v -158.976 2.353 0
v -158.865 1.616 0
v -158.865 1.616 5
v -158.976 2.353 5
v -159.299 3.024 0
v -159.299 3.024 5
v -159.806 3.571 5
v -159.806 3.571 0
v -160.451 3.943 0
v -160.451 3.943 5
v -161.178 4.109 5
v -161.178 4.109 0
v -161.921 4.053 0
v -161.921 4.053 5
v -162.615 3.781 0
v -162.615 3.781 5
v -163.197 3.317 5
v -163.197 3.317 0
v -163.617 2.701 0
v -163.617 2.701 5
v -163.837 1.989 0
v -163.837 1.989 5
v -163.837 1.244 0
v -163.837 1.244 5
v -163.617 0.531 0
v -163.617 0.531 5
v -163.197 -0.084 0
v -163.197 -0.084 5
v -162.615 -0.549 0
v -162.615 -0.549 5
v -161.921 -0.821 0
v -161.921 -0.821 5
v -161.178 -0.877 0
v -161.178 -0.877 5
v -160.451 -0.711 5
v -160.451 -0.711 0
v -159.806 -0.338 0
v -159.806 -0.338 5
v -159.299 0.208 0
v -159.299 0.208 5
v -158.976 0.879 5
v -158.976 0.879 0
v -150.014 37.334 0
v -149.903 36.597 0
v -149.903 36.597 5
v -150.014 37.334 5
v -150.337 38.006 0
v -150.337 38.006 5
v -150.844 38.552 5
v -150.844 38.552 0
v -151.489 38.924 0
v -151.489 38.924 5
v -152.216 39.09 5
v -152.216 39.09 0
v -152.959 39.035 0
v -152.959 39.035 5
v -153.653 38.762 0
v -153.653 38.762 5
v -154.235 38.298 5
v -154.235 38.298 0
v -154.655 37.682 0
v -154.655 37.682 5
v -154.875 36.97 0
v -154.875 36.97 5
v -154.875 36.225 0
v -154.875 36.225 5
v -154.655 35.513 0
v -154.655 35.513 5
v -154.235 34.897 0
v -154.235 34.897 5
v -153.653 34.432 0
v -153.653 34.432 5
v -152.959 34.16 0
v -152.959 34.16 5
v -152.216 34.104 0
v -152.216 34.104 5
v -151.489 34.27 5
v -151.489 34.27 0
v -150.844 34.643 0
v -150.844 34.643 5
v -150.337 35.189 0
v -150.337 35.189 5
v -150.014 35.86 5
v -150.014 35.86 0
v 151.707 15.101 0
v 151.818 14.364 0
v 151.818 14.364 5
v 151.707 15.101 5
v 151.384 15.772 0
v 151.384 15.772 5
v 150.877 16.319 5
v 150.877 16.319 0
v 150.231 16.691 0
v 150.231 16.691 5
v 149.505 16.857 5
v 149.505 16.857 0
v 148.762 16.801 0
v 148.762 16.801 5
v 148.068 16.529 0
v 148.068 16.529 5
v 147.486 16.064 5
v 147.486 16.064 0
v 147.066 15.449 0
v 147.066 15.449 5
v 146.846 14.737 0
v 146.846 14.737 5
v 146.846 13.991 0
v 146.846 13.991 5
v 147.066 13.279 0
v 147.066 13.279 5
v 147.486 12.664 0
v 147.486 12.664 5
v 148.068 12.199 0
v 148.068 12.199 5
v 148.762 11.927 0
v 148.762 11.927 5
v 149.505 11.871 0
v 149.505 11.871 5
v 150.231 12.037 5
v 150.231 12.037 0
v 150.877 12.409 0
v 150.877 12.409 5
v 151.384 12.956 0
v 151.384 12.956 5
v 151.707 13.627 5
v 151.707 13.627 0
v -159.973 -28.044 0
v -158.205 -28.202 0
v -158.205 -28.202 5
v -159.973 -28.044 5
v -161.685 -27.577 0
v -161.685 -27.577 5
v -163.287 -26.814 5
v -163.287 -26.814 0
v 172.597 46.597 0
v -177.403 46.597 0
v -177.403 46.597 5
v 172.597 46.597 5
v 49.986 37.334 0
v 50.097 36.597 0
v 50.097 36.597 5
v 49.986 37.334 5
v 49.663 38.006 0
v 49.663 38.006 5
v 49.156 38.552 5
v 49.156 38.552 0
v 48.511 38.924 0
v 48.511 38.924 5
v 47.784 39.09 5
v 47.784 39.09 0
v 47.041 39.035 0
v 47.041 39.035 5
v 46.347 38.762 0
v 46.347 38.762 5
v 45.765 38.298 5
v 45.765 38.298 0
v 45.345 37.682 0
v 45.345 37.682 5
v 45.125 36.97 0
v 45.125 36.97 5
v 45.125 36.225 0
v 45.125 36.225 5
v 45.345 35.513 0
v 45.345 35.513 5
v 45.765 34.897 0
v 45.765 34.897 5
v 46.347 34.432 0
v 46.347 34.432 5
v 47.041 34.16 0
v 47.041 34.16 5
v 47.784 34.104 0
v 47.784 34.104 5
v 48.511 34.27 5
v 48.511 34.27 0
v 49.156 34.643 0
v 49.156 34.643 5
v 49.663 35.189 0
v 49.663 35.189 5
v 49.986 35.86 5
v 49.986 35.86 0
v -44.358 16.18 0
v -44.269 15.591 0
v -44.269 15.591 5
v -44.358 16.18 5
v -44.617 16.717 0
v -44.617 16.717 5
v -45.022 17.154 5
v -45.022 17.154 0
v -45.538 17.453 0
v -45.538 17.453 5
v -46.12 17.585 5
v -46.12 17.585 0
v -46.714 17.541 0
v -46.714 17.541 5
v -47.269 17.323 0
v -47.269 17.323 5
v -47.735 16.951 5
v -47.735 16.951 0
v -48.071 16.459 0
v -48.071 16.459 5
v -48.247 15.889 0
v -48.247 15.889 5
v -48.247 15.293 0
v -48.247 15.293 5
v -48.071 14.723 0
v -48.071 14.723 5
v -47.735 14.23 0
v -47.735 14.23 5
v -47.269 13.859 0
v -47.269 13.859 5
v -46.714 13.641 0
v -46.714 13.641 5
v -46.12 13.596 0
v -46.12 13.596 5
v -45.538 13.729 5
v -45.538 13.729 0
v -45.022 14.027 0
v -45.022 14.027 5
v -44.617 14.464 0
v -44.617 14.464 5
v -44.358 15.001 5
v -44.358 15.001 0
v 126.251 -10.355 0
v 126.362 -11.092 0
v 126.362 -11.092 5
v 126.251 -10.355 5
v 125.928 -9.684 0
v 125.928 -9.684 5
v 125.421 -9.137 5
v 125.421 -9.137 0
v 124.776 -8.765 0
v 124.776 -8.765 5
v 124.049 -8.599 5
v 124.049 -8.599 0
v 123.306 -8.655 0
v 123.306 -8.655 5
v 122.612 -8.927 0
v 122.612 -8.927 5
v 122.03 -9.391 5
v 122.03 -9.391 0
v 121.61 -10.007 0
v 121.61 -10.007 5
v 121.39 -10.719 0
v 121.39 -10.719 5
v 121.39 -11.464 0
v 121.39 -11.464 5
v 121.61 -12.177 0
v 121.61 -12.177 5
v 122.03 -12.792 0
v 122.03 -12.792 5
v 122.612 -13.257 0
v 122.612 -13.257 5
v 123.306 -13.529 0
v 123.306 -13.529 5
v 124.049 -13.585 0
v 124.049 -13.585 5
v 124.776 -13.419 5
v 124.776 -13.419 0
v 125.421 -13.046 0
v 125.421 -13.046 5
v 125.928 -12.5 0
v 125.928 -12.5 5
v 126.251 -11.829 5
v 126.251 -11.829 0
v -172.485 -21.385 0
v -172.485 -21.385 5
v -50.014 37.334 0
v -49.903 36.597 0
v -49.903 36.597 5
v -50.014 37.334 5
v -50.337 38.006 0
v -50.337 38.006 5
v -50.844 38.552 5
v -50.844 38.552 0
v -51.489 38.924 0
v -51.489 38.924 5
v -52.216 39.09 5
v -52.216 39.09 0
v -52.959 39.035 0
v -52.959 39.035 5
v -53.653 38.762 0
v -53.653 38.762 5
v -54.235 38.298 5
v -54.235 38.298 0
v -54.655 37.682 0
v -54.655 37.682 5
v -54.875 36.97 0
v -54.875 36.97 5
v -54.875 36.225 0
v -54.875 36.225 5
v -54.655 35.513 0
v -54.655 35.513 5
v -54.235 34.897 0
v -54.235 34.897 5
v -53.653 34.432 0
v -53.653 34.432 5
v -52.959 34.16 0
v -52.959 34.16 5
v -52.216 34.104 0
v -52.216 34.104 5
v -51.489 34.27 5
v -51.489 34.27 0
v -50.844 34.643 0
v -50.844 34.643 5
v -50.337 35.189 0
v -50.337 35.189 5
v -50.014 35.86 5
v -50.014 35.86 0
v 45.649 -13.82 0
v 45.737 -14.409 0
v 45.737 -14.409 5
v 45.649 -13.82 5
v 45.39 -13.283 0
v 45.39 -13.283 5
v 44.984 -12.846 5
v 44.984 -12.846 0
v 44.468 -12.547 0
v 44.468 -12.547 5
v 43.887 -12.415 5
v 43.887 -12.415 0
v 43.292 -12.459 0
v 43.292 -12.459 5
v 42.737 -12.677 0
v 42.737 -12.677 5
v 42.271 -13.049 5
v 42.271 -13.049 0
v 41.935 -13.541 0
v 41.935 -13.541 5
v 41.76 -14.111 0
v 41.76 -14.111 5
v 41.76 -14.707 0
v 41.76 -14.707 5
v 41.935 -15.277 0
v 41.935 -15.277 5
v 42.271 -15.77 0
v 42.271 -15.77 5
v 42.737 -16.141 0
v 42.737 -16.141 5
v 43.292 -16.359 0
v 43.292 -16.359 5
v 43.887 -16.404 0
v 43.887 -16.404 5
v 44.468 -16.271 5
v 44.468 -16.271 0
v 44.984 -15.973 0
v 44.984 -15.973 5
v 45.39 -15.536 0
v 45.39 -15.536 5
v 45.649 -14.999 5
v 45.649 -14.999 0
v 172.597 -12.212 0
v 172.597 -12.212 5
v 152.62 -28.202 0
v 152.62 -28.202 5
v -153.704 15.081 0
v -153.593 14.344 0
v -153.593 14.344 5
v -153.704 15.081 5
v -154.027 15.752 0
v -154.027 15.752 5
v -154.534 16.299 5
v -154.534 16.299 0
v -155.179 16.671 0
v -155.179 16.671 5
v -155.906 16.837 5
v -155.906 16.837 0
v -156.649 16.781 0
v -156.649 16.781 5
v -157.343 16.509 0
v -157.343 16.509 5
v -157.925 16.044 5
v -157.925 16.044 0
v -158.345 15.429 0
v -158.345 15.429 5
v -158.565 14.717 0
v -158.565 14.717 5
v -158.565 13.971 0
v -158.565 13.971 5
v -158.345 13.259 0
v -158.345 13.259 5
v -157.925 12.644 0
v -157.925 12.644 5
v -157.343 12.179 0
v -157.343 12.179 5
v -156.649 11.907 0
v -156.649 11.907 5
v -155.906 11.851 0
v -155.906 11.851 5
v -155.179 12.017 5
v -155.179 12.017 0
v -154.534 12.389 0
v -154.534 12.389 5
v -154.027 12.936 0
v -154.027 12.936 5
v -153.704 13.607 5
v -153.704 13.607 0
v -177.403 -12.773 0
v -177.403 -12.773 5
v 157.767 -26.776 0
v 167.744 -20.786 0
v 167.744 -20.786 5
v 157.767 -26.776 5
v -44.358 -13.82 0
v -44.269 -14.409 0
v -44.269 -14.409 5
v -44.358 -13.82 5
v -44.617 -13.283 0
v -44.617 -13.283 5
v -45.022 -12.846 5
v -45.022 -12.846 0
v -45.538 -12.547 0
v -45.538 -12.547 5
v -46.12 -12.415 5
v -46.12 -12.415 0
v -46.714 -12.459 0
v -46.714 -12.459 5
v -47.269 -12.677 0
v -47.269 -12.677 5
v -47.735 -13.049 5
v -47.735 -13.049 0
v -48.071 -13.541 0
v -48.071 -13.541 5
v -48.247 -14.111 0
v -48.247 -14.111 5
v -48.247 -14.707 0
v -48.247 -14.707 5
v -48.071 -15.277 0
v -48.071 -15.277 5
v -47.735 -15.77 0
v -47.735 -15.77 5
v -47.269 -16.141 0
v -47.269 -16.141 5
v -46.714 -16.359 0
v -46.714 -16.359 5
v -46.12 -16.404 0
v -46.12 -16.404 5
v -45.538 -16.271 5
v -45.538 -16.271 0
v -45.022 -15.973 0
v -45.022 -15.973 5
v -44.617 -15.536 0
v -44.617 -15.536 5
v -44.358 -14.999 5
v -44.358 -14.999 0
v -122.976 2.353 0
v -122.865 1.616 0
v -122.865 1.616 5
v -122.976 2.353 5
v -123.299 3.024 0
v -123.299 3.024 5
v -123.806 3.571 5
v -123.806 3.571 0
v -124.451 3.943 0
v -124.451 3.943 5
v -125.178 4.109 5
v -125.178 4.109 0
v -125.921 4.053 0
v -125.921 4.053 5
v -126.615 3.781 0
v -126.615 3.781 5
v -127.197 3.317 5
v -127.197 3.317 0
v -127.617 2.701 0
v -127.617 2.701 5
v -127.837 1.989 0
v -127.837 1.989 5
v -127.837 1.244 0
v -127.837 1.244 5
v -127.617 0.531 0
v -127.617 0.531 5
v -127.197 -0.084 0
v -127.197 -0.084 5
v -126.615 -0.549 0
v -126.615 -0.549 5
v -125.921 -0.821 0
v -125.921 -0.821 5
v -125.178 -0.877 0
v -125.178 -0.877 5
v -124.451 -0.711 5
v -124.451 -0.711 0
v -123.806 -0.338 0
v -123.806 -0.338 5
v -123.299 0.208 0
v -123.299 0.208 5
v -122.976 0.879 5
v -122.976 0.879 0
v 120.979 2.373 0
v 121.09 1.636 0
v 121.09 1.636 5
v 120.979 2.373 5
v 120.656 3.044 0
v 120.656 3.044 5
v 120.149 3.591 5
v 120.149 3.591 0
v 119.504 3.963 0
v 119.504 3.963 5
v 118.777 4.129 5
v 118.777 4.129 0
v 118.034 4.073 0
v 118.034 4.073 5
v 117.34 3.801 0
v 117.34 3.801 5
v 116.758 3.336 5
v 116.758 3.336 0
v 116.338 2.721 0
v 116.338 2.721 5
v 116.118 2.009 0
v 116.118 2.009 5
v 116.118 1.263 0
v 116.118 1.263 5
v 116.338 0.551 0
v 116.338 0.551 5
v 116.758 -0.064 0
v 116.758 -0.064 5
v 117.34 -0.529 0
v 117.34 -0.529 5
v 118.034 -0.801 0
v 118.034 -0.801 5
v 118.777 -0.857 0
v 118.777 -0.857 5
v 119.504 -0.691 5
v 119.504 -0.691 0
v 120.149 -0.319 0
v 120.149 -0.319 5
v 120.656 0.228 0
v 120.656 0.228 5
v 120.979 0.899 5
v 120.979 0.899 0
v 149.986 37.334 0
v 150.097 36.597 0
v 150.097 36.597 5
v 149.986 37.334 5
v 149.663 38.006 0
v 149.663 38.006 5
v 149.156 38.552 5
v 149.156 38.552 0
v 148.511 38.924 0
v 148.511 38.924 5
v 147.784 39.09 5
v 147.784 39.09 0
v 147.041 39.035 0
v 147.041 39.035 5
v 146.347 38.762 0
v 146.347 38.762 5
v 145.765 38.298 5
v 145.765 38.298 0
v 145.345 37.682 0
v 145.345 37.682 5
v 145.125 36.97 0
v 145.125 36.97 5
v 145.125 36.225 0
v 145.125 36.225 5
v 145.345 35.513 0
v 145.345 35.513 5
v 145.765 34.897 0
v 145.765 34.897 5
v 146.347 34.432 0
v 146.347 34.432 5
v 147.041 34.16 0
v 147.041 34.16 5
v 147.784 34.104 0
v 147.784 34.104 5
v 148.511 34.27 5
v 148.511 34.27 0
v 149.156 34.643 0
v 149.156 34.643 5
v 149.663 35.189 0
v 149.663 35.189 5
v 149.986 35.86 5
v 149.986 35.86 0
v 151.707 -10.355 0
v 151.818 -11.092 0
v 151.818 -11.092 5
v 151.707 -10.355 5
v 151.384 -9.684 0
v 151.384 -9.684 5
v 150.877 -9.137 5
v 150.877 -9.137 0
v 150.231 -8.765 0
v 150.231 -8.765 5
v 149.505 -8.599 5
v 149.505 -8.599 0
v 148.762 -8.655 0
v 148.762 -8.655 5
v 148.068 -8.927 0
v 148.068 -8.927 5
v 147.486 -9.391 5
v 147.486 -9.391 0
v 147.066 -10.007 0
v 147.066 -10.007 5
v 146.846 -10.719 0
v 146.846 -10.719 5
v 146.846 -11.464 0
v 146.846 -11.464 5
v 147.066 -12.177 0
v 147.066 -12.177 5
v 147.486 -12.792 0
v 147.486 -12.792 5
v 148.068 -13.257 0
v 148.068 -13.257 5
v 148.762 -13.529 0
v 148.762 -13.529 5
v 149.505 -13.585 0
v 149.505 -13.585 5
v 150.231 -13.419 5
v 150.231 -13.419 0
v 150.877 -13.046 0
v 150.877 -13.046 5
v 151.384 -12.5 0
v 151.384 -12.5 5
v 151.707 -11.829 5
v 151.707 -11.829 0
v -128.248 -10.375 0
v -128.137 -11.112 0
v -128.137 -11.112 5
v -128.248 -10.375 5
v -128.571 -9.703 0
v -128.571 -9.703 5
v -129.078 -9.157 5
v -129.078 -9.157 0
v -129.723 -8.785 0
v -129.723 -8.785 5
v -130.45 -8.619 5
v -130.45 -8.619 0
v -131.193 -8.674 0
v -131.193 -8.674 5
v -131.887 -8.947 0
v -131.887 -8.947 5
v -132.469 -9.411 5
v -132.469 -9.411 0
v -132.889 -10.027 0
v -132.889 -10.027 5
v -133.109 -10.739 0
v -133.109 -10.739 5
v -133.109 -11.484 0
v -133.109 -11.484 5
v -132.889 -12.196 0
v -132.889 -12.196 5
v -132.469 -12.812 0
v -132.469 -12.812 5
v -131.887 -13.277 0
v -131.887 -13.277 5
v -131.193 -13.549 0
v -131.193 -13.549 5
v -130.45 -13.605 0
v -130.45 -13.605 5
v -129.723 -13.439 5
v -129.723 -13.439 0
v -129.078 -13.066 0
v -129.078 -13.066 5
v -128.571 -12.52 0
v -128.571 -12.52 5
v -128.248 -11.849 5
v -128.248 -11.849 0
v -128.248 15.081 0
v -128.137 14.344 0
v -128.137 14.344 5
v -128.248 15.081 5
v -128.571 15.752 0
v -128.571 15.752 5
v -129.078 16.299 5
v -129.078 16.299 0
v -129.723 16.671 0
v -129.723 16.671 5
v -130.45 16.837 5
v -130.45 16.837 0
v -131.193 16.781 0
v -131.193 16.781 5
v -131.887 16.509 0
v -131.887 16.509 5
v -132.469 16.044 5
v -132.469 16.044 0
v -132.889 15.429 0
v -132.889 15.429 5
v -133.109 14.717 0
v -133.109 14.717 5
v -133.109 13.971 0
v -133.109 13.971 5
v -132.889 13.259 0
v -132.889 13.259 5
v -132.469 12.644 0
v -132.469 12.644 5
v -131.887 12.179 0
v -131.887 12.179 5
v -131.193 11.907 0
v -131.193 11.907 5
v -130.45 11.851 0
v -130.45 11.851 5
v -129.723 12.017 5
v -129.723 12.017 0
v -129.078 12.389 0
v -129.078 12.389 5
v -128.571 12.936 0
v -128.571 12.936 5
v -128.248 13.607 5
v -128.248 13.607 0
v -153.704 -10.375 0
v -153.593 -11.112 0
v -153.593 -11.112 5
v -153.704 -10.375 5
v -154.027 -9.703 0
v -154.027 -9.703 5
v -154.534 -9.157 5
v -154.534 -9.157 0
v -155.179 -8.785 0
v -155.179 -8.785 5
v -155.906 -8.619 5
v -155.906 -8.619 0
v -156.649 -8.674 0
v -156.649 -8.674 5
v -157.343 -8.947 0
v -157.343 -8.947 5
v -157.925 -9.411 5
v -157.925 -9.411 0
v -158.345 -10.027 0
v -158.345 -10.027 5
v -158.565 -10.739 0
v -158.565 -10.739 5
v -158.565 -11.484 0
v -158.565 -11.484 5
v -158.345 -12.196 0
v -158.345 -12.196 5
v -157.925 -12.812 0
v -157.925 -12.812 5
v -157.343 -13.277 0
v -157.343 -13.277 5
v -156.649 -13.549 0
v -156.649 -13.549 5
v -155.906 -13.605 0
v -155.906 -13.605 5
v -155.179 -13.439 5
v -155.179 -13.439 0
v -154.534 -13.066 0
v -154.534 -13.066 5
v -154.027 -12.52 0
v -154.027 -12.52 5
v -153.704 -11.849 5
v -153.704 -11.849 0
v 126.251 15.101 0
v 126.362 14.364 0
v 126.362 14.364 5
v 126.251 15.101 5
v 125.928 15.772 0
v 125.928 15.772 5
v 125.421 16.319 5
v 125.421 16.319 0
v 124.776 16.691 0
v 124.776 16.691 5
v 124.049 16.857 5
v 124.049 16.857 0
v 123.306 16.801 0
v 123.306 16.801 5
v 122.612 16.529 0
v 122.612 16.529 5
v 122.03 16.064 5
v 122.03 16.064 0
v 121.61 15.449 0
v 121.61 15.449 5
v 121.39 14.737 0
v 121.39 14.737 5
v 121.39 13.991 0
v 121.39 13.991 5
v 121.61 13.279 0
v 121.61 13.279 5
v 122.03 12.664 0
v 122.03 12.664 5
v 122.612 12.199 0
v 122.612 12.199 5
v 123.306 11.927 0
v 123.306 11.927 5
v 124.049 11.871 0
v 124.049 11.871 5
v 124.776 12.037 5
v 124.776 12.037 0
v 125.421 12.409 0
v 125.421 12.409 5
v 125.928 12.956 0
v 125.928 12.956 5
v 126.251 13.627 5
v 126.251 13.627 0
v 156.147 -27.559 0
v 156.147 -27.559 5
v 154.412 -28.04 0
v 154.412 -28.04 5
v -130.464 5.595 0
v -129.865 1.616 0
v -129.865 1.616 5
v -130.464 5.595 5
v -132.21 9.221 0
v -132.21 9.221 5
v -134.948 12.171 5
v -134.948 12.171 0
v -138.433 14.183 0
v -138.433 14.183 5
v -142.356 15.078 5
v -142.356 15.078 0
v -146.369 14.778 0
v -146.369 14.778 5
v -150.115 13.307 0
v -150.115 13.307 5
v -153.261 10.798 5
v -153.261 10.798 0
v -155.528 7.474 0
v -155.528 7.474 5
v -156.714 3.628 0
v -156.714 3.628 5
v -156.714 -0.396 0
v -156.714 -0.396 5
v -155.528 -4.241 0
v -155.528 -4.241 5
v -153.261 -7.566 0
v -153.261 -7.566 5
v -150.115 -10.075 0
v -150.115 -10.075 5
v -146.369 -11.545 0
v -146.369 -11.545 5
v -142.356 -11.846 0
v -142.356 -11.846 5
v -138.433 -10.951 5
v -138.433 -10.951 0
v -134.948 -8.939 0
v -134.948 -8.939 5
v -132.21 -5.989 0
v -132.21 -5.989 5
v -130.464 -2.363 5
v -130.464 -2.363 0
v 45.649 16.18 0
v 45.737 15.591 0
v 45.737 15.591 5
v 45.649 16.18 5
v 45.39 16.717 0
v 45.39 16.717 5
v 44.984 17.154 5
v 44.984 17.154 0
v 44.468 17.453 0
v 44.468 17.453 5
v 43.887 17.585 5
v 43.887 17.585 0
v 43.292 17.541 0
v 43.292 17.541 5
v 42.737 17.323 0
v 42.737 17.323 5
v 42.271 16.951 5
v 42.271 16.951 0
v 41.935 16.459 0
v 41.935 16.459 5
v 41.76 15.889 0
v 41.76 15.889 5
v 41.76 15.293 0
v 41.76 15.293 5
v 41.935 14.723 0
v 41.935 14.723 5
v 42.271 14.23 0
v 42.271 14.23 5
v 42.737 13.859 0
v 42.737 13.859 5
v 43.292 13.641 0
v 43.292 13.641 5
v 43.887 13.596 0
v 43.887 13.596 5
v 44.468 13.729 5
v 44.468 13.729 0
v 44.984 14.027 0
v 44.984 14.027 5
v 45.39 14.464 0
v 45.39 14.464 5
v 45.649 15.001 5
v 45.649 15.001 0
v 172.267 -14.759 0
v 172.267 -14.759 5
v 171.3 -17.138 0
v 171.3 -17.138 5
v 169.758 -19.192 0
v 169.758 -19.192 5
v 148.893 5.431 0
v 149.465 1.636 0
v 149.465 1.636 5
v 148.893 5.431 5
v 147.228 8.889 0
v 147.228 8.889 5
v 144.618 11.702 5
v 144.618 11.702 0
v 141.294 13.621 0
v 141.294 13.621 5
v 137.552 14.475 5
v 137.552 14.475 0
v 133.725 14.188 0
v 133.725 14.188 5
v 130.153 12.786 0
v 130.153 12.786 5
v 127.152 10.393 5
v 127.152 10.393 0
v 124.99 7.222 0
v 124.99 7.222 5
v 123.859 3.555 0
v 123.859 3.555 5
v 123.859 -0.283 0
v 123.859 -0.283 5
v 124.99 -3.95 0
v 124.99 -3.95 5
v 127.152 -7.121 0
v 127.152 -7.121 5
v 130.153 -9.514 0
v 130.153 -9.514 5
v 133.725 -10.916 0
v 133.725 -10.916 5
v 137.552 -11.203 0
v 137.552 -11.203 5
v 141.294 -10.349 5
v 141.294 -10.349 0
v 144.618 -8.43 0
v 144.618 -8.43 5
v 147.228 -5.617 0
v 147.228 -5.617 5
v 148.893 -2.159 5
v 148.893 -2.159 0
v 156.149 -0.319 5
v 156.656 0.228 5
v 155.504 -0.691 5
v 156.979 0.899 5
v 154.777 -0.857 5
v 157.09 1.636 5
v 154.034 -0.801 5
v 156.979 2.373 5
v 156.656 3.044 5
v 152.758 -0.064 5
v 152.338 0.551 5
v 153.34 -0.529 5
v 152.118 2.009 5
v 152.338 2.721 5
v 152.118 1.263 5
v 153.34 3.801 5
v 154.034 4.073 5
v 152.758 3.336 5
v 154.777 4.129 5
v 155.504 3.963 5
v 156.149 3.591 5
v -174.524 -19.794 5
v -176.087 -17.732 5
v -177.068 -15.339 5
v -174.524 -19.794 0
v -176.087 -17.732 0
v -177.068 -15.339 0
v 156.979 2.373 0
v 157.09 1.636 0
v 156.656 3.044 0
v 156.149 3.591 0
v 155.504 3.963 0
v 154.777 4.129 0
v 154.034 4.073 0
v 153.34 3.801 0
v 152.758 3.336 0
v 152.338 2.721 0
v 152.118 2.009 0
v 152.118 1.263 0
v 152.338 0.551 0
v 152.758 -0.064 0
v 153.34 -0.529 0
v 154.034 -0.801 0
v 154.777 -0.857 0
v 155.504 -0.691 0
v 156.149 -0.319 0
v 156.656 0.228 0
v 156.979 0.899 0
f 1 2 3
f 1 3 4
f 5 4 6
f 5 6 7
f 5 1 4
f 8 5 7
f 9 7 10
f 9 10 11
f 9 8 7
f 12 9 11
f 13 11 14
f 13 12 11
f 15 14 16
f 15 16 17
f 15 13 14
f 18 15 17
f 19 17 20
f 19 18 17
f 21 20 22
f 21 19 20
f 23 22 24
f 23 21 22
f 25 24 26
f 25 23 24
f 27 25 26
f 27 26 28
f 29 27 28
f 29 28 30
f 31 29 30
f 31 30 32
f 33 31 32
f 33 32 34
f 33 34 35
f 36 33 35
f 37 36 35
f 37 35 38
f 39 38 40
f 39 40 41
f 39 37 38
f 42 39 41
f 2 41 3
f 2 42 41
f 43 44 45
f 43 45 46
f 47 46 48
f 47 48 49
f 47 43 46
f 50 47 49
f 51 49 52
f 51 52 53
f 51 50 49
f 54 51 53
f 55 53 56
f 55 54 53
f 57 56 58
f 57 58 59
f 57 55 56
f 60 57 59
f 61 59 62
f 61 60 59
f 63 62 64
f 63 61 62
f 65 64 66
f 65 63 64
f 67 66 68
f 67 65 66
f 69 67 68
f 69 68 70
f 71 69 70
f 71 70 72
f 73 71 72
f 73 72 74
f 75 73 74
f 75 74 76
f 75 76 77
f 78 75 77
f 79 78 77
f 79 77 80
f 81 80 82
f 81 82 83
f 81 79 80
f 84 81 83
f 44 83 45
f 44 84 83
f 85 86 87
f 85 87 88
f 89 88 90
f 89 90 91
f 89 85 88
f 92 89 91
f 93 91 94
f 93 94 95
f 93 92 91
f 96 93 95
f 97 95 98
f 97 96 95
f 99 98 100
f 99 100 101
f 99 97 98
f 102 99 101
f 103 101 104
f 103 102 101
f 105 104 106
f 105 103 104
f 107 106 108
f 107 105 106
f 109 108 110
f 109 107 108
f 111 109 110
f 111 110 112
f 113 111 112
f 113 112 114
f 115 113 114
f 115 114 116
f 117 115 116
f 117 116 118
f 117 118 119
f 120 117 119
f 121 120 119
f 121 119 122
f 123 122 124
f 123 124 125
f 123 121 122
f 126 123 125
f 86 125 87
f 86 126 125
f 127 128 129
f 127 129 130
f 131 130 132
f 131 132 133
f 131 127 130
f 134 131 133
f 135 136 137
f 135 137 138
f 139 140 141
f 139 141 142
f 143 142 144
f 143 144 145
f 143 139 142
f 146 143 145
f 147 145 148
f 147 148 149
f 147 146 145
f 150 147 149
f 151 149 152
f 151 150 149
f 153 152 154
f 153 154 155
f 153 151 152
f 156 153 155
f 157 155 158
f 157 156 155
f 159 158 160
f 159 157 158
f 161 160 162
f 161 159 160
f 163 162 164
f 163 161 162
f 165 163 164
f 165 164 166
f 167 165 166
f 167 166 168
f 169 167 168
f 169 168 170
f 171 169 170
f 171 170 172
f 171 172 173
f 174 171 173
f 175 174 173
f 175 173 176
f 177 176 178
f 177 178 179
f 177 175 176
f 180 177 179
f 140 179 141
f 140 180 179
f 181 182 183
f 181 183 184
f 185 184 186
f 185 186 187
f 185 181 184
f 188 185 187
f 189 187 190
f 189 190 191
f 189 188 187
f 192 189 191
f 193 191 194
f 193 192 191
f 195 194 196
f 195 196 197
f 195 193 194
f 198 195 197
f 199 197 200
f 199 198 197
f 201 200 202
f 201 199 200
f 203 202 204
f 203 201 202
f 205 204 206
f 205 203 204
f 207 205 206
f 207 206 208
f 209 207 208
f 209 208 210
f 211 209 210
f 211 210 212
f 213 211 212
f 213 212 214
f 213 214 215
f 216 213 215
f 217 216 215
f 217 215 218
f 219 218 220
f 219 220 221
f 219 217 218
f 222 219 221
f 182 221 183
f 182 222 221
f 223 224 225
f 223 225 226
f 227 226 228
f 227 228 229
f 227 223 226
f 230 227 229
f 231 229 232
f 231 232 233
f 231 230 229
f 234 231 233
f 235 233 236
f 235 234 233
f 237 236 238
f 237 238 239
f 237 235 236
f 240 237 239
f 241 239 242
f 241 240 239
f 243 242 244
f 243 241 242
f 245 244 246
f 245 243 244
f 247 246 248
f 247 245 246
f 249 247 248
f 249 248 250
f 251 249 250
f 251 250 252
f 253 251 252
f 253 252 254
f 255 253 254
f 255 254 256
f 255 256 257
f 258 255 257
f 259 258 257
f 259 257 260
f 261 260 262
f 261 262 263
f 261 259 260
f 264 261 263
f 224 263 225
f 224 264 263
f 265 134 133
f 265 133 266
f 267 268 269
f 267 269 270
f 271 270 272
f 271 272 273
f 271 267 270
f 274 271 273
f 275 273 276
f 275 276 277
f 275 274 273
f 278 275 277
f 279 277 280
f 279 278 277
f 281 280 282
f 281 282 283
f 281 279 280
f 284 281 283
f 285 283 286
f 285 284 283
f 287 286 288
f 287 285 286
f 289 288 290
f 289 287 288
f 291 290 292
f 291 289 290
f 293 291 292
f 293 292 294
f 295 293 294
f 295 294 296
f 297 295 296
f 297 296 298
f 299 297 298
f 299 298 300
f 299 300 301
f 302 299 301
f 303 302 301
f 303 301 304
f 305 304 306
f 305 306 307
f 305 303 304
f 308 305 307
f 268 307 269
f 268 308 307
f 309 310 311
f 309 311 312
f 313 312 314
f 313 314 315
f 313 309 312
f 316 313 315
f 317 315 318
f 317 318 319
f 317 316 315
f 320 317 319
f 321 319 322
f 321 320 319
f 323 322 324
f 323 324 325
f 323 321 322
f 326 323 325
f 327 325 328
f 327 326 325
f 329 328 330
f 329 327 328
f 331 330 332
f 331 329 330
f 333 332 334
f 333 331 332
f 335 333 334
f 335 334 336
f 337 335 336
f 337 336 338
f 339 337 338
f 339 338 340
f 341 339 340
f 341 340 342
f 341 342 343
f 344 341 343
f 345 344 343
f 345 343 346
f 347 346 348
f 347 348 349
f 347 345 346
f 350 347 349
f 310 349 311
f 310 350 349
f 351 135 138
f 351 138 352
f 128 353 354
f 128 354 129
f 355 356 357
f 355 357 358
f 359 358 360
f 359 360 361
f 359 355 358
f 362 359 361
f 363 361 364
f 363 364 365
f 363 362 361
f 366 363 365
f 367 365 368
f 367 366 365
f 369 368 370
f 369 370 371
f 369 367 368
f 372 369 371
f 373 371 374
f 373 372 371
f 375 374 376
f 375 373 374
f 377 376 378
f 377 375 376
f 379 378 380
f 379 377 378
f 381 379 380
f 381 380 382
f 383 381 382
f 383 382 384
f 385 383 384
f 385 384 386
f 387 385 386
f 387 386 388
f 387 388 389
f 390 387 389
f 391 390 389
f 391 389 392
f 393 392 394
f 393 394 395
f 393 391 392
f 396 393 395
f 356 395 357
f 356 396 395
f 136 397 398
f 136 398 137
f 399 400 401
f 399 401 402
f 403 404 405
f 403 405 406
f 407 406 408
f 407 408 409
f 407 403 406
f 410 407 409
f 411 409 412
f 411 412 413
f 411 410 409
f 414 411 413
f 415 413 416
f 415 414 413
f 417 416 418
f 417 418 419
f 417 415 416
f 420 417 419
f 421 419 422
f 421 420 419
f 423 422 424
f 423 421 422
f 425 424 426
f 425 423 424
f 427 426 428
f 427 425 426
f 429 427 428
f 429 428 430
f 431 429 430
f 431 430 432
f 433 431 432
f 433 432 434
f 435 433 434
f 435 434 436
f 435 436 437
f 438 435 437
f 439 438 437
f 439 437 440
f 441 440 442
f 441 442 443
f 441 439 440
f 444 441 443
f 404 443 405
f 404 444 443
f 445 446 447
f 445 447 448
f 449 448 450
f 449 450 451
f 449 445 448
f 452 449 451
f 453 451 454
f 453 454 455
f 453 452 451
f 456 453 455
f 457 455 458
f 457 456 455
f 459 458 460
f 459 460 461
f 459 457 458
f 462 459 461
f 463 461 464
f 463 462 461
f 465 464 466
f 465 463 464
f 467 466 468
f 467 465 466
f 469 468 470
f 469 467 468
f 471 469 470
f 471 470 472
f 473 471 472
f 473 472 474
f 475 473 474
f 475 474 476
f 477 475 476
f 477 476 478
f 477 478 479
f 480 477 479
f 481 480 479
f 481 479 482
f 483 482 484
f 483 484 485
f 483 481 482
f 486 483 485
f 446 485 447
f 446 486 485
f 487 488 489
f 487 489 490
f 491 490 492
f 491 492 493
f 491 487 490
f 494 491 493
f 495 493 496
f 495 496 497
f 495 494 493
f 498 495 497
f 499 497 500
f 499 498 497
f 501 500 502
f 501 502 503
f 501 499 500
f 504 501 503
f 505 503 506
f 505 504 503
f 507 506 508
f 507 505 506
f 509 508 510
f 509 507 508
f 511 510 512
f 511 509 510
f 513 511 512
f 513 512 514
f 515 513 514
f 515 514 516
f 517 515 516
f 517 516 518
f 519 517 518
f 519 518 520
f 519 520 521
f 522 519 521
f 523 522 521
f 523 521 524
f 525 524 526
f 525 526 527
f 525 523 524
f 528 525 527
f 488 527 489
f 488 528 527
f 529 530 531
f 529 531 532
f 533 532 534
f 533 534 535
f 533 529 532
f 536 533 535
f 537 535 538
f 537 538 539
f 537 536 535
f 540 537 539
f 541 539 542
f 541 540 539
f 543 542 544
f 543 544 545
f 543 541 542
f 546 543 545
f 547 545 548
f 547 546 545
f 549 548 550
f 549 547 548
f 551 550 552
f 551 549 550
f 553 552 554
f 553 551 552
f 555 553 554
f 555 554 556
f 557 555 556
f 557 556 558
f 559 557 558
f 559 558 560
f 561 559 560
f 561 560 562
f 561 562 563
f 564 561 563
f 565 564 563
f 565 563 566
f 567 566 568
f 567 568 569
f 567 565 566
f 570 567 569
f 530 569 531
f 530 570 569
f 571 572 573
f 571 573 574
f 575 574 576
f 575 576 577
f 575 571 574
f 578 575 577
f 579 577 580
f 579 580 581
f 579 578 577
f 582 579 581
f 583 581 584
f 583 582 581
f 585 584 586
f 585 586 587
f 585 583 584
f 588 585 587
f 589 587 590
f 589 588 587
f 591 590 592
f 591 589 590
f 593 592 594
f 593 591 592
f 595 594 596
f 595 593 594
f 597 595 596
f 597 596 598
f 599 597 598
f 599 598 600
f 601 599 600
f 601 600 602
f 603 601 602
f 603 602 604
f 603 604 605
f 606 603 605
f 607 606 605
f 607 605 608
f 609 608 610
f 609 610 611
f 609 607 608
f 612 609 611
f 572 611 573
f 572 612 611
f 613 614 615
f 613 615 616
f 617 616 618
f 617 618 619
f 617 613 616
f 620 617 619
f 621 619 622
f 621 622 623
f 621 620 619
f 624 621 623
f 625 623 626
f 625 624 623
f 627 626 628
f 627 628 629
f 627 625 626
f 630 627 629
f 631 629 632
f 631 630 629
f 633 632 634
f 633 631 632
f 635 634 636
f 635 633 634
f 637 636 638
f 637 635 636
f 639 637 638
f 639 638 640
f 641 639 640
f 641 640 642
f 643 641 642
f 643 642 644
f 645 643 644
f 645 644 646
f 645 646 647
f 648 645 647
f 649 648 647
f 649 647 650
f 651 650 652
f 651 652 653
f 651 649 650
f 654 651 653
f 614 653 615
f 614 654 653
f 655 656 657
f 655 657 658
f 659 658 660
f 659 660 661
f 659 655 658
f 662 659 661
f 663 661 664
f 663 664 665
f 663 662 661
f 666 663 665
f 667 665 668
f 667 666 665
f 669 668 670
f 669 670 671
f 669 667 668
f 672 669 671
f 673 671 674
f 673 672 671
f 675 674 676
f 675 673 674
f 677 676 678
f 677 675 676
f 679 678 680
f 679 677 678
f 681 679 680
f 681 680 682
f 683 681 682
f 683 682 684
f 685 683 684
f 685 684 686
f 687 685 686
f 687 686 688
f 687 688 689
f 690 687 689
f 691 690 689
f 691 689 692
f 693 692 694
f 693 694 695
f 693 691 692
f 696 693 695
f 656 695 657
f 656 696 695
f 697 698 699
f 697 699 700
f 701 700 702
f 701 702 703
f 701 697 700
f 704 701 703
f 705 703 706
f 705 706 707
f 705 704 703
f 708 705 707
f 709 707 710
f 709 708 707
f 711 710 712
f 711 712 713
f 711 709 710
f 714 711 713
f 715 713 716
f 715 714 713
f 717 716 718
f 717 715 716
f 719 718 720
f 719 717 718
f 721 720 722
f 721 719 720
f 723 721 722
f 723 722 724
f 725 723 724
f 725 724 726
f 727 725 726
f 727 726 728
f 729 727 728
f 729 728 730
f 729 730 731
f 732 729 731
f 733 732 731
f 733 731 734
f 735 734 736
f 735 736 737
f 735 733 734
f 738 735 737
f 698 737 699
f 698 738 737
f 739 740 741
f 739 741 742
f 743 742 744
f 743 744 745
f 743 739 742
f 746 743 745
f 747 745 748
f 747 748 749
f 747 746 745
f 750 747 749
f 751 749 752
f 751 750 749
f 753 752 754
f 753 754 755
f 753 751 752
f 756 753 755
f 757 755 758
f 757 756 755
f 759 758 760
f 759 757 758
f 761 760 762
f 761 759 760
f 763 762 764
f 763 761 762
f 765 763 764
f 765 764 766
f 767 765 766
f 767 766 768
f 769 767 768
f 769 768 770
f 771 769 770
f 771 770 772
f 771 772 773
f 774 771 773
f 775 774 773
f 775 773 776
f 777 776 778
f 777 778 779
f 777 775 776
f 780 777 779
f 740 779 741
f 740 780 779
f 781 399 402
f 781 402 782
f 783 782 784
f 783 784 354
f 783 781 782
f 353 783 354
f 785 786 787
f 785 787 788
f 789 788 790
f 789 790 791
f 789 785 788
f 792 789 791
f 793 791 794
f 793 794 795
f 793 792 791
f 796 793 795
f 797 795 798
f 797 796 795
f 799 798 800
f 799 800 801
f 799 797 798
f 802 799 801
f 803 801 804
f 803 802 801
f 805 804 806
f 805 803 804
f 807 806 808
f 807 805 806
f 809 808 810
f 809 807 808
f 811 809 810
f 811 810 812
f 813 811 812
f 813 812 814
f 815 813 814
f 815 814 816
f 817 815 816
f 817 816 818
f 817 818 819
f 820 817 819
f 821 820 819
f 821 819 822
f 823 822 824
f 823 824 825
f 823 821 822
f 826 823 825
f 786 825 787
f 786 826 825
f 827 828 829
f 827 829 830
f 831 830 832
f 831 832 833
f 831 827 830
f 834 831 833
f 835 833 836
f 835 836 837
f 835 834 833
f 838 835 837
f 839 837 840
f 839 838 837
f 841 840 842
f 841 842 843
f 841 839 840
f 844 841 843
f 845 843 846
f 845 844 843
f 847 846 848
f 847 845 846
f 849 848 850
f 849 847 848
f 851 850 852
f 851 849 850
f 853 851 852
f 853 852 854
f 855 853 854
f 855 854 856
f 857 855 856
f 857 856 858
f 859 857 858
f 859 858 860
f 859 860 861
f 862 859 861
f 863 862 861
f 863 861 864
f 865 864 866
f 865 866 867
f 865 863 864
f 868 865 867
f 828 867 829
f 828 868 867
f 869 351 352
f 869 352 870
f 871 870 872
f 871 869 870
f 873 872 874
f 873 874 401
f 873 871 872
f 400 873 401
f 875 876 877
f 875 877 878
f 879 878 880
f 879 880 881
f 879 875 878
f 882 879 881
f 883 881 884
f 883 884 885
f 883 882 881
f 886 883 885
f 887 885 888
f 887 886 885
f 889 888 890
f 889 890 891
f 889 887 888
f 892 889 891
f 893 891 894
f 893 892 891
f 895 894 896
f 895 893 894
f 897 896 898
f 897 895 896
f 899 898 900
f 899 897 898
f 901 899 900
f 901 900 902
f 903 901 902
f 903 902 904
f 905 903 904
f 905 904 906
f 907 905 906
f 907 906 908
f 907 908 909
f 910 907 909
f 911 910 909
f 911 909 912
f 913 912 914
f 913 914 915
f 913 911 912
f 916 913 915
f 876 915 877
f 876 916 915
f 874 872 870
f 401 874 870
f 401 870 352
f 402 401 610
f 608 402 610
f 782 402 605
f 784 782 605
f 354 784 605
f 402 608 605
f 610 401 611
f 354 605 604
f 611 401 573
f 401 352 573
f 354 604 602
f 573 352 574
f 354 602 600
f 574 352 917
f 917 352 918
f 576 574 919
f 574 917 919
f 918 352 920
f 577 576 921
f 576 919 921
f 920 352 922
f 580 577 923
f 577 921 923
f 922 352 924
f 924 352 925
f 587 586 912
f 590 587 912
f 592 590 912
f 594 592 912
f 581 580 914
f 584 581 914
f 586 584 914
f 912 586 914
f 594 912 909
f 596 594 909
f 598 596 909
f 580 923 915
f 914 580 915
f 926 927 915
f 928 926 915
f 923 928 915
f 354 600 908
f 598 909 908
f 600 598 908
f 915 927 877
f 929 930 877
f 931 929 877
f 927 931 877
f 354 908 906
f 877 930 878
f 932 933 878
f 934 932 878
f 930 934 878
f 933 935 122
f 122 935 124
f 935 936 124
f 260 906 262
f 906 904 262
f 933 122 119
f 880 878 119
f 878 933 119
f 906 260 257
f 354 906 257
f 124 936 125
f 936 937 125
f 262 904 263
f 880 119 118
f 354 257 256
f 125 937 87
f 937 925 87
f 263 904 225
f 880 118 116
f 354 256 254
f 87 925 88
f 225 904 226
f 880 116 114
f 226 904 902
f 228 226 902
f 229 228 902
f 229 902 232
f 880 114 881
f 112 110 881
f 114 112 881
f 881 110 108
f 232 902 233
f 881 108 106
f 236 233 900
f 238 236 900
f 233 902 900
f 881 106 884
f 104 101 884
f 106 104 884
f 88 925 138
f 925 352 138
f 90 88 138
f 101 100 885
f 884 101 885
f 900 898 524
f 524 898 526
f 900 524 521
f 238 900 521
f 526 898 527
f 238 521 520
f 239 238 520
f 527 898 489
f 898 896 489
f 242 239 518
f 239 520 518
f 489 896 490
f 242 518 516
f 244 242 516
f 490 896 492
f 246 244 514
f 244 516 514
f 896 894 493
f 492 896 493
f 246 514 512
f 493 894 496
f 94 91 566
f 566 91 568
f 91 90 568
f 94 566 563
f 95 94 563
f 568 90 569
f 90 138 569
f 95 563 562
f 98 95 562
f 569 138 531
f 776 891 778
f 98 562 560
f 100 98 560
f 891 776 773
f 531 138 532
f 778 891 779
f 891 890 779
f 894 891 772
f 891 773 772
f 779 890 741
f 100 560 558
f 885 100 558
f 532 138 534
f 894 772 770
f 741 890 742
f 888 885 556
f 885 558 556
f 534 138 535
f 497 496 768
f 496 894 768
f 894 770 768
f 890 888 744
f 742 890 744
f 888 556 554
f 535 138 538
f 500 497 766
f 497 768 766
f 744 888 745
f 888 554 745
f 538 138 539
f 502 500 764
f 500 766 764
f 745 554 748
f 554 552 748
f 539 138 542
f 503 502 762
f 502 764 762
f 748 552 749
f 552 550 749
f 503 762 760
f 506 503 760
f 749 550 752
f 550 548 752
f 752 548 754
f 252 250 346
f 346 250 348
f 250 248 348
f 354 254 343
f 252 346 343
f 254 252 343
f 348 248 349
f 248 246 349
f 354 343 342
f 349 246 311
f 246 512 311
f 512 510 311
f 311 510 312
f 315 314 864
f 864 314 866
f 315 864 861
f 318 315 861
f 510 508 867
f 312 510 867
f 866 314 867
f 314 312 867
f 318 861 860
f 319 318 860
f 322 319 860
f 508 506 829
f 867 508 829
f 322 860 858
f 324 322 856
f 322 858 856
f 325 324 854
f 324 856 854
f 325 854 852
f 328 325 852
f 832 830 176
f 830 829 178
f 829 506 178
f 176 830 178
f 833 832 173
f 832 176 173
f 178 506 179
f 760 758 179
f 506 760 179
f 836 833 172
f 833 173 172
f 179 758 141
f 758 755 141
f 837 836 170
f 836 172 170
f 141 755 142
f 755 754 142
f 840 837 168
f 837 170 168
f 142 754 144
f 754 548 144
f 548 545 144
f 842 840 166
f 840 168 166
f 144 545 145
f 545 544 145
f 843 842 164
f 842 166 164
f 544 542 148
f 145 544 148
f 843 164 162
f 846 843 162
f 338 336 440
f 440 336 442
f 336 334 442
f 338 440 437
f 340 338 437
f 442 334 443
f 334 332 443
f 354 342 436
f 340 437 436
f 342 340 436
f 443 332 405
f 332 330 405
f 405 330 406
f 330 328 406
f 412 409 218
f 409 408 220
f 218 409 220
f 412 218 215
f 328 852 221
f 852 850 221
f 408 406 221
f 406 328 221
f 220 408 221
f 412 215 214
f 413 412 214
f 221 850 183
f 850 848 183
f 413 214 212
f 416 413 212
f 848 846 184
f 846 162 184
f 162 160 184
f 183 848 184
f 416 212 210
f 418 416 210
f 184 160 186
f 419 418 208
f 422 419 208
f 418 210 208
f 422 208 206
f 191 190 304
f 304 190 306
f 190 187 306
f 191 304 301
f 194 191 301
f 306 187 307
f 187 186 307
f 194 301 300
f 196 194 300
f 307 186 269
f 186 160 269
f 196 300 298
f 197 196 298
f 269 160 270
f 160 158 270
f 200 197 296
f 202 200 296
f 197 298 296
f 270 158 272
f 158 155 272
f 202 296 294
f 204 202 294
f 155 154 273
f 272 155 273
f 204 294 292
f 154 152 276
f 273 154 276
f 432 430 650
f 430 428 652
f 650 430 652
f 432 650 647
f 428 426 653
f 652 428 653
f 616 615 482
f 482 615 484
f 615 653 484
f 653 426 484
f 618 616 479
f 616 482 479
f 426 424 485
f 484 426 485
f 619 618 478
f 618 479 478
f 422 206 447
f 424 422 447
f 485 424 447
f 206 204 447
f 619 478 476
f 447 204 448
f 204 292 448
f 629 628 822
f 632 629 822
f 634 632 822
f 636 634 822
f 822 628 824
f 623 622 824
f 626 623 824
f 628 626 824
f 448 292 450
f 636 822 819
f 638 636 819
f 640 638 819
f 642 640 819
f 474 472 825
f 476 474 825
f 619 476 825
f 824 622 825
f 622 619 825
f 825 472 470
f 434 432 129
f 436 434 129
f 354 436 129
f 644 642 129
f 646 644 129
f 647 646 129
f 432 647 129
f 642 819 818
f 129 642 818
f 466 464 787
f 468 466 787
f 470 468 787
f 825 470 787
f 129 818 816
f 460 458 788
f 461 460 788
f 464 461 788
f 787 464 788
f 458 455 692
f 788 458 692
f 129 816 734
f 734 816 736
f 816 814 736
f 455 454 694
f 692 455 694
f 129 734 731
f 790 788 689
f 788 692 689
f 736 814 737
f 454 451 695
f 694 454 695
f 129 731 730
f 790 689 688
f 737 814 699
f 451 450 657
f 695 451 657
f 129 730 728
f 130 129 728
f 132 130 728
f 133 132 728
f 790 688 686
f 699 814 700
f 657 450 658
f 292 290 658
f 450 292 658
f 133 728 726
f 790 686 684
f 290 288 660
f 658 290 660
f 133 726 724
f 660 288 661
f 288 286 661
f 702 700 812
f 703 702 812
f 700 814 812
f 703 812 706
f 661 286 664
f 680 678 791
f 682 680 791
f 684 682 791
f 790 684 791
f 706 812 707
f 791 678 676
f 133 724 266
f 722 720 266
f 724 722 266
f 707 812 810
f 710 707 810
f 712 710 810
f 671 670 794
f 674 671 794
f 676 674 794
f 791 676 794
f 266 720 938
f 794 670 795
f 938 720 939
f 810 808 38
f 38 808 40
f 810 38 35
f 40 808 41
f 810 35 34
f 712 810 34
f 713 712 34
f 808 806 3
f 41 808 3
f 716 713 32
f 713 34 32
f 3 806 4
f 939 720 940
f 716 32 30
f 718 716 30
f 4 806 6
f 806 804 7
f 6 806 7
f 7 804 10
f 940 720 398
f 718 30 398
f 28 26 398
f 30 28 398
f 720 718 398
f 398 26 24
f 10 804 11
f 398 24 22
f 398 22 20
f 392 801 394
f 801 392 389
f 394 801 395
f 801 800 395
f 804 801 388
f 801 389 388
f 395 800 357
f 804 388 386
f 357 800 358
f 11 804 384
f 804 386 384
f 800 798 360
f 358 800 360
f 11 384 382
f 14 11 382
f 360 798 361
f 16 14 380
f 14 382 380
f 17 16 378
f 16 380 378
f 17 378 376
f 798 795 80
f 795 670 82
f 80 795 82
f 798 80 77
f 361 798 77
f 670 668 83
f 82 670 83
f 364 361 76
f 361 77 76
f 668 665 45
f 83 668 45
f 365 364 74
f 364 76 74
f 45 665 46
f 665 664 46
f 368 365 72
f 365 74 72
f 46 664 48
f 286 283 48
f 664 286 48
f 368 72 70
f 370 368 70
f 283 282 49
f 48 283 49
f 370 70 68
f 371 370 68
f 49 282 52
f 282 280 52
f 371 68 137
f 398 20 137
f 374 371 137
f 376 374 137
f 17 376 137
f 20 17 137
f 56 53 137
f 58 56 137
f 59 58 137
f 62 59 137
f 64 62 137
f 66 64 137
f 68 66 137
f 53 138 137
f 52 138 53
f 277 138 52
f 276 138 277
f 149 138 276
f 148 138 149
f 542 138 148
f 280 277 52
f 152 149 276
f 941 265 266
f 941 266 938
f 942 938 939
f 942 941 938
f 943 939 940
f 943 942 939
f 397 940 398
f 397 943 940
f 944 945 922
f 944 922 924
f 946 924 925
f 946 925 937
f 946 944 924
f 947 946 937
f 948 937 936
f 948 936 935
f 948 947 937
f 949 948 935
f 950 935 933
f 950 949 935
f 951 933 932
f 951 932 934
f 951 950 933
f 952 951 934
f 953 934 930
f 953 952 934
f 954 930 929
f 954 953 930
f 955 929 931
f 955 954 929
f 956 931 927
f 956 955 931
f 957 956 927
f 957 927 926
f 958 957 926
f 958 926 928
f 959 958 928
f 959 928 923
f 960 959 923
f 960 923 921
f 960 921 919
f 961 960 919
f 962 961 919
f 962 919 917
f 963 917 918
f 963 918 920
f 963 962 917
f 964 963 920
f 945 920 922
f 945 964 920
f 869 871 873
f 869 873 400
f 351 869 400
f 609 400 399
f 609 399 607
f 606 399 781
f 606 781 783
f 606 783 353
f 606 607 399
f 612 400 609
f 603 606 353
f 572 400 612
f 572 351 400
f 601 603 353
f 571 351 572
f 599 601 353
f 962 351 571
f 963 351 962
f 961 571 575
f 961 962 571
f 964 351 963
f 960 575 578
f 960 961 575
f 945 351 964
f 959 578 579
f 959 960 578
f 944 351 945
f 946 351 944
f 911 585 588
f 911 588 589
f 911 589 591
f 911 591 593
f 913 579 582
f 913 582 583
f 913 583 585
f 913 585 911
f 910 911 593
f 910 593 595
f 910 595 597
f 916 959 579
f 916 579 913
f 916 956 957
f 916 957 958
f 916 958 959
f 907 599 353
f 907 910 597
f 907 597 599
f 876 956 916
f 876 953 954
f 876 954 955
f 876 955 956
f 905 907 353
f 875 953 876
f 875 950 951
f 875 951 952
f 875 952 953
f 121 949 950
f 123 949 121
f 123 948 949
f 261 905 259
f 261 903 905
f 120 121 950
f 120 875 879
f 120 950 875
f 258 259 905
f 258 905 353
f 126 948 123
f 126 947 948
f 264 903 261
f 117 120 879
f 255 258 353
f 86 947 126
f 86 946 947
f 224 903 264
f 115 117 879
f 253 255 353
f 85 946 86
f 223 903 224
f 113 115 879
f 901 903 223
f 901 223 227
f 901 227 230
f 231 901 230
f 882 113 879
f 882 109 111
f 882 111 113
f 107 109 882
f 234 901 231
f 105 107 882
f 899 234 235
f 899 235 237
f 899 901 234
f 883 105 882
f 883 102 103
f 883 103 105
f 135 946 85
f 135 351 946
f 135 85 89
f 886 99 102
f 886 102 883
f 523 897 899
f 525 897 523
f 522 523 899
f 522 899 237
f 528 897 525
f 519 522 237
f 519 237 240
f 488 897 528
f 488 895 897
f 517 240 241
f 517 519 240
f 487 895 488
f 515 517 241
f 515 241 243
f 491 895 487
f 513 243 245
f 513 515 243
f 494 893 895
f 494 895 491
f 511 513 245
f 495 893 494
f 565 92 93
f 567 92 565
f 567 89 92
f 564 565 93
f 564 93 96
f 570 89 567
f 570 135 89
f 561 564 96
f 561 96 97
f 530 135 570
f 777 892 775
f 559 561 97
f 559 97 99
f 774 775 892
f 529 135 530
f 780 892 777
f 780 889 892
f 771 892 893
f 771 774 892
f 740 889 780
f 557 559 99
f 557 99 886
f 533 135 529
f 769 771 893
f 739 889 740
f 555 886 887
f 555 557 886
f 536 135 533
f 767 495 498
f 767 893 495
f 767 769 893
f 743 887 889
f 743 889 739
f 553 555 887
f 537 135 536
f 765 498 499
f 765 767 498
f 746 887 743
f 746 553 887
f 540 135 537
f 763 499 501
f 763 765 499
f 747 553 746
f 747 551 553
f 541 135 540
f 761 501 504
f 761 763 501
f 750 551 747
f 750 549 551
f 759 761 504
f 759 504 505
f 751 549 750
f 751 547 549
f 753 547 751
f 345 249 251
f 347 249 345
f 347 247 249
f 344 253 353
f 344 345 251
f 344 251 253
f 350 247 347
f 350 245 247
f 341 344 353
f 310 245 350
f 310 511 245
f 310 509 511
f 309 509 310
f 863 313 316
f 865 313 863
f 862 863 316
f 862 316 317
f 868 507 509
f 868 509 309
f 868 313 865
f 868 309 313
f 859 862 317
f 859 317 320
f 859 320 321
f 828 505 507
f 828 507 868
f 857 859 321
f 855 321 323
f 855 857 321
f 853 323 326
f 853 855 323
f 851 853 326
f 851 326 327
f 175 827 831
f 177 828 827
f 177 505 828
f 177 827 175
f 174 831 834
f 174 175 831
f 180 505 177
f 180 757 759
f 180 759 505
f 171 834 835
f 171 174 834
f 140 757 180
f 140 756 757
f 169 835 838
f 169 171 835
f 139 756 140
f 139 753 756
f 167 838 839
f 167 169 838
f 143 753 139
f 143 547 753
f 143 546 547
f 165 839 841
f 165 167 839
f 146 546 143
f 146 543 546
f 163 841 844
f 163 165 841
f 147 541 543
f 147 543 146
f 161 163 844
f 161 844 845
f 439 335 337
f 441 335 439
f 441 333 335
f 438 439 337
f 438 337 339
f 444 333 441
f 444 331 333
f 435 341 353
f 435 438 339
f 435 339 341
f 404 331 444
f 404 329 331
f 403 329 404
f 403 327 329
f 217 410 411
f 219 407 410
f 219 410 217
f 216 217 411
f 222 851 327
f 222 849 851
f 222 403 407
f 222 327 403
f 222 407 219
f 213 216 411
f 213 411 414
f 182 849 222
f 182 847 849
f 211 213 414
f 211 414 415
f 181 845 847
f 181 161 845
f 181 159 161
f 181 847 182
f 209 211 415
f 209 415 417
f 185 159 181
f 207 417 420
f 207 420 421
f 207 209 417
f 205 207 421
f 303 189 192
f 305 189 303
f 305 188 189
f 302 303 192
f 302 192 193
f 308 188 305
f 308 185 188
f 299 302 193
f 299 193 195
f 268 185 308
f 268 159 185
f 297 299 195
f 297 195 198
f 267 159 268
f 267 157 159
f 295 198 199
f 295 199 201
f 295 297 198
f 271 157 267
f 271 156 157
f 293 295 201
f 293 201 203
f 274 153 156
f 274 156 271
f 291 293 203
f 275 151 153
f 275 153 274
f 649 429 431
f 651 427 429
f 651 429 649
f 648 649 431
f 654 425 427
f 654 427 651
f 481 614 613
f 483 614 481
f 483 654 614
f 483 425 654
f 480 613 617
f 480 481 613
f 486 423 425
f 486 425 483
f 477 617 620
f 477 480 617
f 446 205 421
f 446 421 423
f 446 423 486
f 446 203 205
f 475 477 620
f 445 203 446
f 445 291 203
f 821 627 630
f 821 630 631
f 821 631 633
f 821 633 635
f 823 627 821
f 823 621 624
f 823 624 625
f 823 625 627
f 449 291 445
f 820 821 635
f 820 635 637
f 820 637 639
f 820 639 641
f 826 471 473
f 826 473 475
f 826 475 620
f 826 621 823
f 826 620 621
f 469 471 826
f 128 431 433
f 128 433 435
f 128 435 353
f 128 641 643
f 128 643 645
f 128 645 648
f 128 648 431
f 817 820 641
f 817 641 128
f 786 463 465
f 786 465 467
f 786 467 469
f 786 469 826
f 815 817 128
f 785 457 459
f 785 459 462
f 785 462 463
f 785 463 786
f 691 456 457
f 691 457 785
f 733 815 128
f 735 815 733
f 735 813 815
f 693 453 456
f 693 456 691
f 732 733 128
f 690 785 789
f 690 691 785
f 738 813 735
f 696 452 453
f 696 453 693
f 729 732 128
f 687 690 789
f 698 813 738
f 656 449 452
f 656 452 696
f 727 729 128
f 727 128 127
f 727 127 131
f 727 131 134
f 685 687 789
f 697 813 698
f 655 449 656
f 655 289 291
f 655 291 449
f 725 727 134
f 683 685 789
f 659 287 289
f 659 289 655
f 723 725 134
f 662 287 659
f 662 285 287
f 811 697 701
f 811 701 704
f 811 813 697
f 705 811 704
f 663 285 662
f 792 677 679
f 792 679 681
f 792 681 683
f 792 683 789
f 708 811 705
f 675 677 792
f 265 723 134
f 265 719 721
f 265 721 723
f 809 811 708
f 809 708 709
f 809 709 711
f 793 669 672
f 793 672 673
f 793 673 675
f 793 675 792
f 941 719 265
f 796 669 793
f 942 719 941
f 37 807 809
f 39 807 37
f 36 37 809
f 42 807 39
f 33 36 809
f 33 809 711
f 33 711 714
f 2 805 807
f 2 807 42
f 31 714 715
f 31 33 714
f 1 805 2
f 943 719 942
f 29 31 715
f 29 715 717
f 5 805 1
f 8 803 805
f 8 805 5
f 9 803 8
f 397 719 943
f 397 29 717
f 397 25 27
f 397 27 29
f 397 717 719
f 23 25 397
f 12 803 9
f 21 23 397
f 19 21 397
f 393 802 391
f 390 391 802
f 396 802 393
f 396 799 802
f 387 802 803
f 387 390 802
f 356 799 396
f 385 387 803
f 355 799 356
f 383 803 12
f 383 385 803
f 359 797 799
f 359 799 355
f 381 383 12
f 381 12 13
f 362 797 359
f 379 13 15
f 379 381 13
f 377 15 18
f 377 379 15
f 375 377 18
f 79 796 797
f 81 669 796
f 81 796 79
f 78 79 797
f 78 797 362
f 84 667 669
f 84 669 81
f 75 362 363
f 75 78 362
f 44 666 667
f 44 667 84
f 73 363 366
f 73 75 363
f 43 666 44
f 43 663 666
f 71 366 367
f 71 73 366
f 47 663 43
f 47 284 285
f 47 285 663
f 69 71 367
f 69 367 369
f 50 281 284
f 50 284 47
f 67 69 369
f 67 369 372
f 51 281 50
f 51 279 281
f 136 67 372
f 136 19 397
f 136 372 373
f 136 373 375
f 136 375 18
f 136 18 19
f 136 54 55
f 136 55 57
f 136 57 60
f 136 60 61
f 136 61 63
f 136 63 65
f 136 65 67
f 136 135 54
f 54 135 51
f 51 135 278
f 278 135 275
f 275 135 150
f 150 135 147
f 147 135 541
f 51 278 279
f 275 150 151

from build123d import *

# Parameters (mm, degrees)
SKETCH_1_R      = 2.5
SKETCH_1_R_2    = 12.875
SKETCH_1_R_3    = 13.5
SKETCH_1_R_4    = 2
EXTRUDE_1_DEPTH = 5


with BuildPart() as part:
    # 草圖1 → 填料-伸長1 (new body)
    with BuildSketch(Plane.XY):
        with BuildLine():
            Line((-177.402767175, 46.597232825), (172.597232825, 46.597232825))
            Line((172.597232825, 46.597232825), (172.597232825, -3.218275341))
            Line((172.597232825, -3.218275341), (172.597232825, -12.212255112))
            ThreePointArc((172.597232825, -12.212255112), (171.299816564, -17.138210478), (167.744225572, -20.785962926))
            Line((167.744225572, -20.785962926), (157.766802923, -26.775637768))
            ThreePointArc((157.766802923, -26.775637768), (155.290289709, -27.838762374), (152.619810177, -28.201929955))
            Line((152.619810177, -28.201929955), (-158.204749101, -28.201929955))
            ThreePointArc((-158.204749101, -28.201929955), (-160.839127997, -27.848693549), (-163.287395186, -26.813939522))
            Line((-163.287395186, -26.813939522), (-172.48541326, -21.385442237))
            ThreePointArc((-172.48541326, -21.385442237), (-176.08684631, -17.731937443), (-177.402767175, -12.77343267))
            Line((-177.402767175, -12.77343267), (-177.402767175, -10.307650594))
            Line((-177.402767175, -10.307650594), (-177.402767175, -3.218275341))
            Line((-177.402767175, -3.218275341), (-177.402767175, 46.597232825))
        make_face()
        with Locations((118.590211239, 1.636058568)):
            Circle(SKETCH_1_R, mode=Mode.SUBTRACT)
        with Locations((154.590211239, 1.636058568)):
            Circle(SKETCH_1_R, mode=Mode.SUBTRACT)
        with Locations((136.590211239, 1.636058568)):
            Circle(SKETCH_1_R_2, mode=Mode.SUBTRACT)
        with Locations((-143.364629919, 1.616144457)):
            Circle(SKETCH_1_R_3, mode=Mode.SUBTRACT)
        with Locations((-130.636707858, 14.344066518)):
            Circle(SKETCH_1_R, mode=Mode.SUBTRACT)
        with Locations((-156.09255198, 14.344066518)):
            Circle(SKETCH_1_R, mode=Mode.SUBTRACT)
        with Locations((-130.636707858, -11.111777604)):
            Circle(SKETCH_1_R, mode=Mode.SUBTRACT)
        with Locations((-156.09255198, -11.111777604)):
            Circle(SKETCH_1_R, mode=Mode.SUBTRACT)
        with Locations((-152.402767175, 36.597232825)):
            Circle(SKETCH_1_R, mode=Mode.SUBTRACT)
        with Locations((-52.402767175, 36.597232825)):
            Circle(SKETCH_1_R, mode=Mode.SUBTRACT)
        with Locations((47.597232825, 36.597232825)):
            Circle(SKETCH_1_R, mode=Mode.SUBTRACT)
        with Locations((147.597232825, 36.597232825)):
            Circle(SKETCH_1_R, mode=Mode.SUBTRACT)
        with Locations((-161.364629919, 1.616144457)):
            Circle(SKETCH_1_R, mode=Mode.SUBTRACT)
        with Locations((-125.364629919, 1.616144457)):
            Circle(SKETCH_1_R, mode=Mode.SUBTRACT)
        with Locations((149.318133301, -11.091863493)):
            Circle(SKETCH_1_R, mode=Mode.SUBTRACT)
        with Locations((123.862289178, -11.091863493)):
            Circle(SKETCH_1_R, mode=Mode.SUBTRACT)
        with Locations((123.862289178, 14.363980629)):
            Circle(SKETCH_1_R, mode=Mode.SUBTRACT)
        with Locations((149.318133301, 14.363980629)):
            Circle(SKETCH_1_R, mode=Mode.SUBTRACT)
        with Locations((-46.268993965, 15.590754881)):
            Circle(SKETCH_1_R_4, mode=Mode.SUBTRACT)
        with Locations((-46.268993965, -14.409245119)):
            Circle(SKETCH_1_R_4, mode=Mode.SUBTRACT)
        with Locations((43.737437285, 15.590754881)):
            Circle(SKETCH_1_R_4, mode=Mode.SUBTRACT)
        with Locations((43.737437285, -14.409245119)):
            Circle(SKETCH_1_R_4, mode=Mode.SUBTRACT)
    extrude(amount=EXTRUDE_1_DEPTH)


solid = part.part
